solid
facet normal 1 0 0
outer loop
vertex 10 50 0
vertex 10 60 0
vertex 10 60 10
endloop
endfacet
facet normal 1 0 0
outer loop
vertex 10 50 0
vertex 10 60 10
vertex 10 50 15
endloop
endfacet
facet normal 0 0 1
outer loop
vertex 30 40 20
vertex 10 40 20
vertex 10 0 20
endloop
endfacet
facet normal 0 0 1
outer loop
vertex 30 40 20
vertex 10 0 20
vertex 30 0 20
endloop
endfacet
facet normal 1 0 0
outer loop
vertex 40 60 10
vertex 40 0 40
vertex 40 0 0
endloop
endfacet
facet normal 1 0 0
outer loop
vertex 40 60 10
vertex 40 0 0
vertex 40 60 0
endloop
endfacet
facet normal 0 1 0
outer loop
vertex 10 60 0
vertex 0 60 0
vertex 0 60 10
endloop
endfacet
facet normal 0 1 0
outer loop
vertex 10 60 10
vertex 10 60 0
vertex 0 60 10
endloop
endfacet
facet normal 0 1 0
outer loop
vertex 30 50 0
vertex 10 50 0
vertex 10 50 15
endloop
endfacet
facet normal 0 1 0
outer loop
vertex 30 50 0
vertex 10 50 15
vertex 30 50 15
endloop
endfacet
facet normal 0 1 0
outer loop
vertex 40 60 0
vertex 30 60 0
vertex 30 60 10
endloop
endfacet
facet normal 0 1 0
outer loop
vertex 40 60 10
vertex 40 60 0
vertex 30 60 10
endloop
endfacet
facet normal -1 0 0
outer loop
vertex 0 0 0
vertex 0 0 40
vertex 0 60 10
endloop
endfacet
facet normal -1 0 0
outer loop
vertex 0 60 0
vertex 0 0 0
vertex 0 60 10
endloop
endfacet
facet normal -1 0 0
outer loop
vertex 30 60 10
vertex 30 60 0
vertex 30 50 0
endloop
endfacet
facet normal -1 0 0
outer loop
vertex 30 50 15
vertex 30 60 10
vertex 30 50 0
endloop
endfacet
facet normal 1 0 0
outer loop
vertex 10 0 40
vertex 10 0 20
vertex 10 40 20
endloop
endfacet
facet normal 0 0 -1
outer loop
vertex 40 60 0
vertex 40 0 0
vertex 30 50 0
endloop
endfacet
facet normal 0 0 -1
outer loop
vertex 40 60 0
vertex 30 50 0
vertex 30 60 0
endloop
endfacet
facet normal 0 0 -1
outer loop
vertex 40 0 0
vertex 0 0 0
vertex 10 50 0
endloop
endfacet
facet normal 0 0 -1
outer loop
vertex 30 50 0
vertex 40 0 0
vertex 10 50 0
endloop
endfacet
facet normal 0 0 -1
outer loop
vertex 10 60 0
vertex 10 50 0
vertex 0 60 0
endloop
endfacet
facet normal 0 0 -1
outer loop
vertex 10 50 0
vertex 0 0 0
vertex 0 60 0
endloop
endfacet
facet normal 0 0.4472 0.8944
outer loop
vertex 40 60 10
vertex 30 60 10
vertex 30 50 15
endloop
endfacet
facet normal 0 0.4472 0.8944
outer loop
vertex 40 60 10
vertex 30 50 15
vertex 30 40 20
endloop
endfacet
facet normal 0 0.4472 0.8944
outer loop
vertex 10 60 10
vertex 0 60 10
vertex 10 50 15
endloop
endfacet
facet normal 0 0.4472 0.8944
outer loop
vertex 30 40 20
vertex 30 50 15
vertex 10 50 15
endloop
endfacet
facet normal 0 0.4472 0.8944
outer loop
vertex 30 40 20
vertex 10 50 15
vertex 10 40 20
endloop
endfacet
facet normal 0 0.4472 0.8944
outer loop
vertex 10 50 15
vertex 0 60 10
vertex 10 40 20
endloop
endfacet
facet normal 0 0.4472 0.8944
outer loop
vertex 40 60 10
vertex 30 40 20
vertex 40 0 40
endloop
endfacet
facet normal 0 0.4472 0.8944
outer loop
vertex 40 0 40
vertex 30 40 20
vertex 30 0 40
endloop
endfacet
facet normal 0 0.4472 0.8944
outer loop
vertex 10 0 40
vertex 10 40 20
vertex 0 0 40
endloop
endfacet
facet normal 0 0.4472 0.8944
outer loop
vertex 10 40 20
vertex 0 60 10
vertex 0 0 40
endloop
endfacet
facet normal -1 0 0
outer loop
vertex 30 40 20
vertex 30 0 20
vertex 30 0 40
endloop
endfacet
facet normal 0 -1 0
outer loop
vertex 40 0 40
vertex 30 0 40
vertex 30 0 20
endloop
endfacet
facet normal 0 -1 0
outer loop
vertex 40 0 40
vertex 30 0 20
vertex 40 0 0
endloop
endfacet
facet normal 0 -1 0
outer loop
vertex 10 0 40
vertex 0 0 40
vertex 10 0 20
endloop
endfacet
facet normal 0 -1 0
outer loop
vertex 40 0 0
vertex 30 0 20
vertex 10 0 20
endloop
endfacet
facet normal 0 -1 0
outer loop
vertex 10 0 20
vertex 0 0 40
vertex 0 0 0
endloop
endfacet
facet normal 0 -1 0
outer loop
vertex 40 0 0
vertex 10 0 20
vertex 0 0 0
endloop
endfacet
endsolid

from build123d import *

# Parameters (mm, degrees)
F1_DEPTH = 40
F2_W     = 20
F2_H     = 10
F3_DEPTH = 40.001
F4_W     = 20
F4_H     = 20
F5_DEPTH = 60.001


with BuildPart() as f1:
    # F0 (on Right) → F1 (new body)
    with BuildSketch(Plane.YZ):
        Polygon((60, 10), (0, 40), (0, 0), (60, 0), align=None)
    extrude(amount=F1_DEPTH)

    # F2 (on face) → F3 (cut, through all)
    with BuildSketch(Plane(origin=(0, 0, 0), x_dir=(1, 0, 0), z_dir=(0, 0, -1))):
        with Locations((20, -55)):
            Rectangle(F2_W, F2_H)
    extrude(amount=-F3_DEPTH, mode=Mode.SUBTRACT)

    # F4 (on face) → F5 (cut, through all)
    with BuildSketch(Plane.XZ):
        with Locations((20, 30)):
            Rectangle(F4_W, F4_H)
    extrude(amount=-F5_DEPTH, mode=Mode.SUBTRACT)


solid = f1.part
